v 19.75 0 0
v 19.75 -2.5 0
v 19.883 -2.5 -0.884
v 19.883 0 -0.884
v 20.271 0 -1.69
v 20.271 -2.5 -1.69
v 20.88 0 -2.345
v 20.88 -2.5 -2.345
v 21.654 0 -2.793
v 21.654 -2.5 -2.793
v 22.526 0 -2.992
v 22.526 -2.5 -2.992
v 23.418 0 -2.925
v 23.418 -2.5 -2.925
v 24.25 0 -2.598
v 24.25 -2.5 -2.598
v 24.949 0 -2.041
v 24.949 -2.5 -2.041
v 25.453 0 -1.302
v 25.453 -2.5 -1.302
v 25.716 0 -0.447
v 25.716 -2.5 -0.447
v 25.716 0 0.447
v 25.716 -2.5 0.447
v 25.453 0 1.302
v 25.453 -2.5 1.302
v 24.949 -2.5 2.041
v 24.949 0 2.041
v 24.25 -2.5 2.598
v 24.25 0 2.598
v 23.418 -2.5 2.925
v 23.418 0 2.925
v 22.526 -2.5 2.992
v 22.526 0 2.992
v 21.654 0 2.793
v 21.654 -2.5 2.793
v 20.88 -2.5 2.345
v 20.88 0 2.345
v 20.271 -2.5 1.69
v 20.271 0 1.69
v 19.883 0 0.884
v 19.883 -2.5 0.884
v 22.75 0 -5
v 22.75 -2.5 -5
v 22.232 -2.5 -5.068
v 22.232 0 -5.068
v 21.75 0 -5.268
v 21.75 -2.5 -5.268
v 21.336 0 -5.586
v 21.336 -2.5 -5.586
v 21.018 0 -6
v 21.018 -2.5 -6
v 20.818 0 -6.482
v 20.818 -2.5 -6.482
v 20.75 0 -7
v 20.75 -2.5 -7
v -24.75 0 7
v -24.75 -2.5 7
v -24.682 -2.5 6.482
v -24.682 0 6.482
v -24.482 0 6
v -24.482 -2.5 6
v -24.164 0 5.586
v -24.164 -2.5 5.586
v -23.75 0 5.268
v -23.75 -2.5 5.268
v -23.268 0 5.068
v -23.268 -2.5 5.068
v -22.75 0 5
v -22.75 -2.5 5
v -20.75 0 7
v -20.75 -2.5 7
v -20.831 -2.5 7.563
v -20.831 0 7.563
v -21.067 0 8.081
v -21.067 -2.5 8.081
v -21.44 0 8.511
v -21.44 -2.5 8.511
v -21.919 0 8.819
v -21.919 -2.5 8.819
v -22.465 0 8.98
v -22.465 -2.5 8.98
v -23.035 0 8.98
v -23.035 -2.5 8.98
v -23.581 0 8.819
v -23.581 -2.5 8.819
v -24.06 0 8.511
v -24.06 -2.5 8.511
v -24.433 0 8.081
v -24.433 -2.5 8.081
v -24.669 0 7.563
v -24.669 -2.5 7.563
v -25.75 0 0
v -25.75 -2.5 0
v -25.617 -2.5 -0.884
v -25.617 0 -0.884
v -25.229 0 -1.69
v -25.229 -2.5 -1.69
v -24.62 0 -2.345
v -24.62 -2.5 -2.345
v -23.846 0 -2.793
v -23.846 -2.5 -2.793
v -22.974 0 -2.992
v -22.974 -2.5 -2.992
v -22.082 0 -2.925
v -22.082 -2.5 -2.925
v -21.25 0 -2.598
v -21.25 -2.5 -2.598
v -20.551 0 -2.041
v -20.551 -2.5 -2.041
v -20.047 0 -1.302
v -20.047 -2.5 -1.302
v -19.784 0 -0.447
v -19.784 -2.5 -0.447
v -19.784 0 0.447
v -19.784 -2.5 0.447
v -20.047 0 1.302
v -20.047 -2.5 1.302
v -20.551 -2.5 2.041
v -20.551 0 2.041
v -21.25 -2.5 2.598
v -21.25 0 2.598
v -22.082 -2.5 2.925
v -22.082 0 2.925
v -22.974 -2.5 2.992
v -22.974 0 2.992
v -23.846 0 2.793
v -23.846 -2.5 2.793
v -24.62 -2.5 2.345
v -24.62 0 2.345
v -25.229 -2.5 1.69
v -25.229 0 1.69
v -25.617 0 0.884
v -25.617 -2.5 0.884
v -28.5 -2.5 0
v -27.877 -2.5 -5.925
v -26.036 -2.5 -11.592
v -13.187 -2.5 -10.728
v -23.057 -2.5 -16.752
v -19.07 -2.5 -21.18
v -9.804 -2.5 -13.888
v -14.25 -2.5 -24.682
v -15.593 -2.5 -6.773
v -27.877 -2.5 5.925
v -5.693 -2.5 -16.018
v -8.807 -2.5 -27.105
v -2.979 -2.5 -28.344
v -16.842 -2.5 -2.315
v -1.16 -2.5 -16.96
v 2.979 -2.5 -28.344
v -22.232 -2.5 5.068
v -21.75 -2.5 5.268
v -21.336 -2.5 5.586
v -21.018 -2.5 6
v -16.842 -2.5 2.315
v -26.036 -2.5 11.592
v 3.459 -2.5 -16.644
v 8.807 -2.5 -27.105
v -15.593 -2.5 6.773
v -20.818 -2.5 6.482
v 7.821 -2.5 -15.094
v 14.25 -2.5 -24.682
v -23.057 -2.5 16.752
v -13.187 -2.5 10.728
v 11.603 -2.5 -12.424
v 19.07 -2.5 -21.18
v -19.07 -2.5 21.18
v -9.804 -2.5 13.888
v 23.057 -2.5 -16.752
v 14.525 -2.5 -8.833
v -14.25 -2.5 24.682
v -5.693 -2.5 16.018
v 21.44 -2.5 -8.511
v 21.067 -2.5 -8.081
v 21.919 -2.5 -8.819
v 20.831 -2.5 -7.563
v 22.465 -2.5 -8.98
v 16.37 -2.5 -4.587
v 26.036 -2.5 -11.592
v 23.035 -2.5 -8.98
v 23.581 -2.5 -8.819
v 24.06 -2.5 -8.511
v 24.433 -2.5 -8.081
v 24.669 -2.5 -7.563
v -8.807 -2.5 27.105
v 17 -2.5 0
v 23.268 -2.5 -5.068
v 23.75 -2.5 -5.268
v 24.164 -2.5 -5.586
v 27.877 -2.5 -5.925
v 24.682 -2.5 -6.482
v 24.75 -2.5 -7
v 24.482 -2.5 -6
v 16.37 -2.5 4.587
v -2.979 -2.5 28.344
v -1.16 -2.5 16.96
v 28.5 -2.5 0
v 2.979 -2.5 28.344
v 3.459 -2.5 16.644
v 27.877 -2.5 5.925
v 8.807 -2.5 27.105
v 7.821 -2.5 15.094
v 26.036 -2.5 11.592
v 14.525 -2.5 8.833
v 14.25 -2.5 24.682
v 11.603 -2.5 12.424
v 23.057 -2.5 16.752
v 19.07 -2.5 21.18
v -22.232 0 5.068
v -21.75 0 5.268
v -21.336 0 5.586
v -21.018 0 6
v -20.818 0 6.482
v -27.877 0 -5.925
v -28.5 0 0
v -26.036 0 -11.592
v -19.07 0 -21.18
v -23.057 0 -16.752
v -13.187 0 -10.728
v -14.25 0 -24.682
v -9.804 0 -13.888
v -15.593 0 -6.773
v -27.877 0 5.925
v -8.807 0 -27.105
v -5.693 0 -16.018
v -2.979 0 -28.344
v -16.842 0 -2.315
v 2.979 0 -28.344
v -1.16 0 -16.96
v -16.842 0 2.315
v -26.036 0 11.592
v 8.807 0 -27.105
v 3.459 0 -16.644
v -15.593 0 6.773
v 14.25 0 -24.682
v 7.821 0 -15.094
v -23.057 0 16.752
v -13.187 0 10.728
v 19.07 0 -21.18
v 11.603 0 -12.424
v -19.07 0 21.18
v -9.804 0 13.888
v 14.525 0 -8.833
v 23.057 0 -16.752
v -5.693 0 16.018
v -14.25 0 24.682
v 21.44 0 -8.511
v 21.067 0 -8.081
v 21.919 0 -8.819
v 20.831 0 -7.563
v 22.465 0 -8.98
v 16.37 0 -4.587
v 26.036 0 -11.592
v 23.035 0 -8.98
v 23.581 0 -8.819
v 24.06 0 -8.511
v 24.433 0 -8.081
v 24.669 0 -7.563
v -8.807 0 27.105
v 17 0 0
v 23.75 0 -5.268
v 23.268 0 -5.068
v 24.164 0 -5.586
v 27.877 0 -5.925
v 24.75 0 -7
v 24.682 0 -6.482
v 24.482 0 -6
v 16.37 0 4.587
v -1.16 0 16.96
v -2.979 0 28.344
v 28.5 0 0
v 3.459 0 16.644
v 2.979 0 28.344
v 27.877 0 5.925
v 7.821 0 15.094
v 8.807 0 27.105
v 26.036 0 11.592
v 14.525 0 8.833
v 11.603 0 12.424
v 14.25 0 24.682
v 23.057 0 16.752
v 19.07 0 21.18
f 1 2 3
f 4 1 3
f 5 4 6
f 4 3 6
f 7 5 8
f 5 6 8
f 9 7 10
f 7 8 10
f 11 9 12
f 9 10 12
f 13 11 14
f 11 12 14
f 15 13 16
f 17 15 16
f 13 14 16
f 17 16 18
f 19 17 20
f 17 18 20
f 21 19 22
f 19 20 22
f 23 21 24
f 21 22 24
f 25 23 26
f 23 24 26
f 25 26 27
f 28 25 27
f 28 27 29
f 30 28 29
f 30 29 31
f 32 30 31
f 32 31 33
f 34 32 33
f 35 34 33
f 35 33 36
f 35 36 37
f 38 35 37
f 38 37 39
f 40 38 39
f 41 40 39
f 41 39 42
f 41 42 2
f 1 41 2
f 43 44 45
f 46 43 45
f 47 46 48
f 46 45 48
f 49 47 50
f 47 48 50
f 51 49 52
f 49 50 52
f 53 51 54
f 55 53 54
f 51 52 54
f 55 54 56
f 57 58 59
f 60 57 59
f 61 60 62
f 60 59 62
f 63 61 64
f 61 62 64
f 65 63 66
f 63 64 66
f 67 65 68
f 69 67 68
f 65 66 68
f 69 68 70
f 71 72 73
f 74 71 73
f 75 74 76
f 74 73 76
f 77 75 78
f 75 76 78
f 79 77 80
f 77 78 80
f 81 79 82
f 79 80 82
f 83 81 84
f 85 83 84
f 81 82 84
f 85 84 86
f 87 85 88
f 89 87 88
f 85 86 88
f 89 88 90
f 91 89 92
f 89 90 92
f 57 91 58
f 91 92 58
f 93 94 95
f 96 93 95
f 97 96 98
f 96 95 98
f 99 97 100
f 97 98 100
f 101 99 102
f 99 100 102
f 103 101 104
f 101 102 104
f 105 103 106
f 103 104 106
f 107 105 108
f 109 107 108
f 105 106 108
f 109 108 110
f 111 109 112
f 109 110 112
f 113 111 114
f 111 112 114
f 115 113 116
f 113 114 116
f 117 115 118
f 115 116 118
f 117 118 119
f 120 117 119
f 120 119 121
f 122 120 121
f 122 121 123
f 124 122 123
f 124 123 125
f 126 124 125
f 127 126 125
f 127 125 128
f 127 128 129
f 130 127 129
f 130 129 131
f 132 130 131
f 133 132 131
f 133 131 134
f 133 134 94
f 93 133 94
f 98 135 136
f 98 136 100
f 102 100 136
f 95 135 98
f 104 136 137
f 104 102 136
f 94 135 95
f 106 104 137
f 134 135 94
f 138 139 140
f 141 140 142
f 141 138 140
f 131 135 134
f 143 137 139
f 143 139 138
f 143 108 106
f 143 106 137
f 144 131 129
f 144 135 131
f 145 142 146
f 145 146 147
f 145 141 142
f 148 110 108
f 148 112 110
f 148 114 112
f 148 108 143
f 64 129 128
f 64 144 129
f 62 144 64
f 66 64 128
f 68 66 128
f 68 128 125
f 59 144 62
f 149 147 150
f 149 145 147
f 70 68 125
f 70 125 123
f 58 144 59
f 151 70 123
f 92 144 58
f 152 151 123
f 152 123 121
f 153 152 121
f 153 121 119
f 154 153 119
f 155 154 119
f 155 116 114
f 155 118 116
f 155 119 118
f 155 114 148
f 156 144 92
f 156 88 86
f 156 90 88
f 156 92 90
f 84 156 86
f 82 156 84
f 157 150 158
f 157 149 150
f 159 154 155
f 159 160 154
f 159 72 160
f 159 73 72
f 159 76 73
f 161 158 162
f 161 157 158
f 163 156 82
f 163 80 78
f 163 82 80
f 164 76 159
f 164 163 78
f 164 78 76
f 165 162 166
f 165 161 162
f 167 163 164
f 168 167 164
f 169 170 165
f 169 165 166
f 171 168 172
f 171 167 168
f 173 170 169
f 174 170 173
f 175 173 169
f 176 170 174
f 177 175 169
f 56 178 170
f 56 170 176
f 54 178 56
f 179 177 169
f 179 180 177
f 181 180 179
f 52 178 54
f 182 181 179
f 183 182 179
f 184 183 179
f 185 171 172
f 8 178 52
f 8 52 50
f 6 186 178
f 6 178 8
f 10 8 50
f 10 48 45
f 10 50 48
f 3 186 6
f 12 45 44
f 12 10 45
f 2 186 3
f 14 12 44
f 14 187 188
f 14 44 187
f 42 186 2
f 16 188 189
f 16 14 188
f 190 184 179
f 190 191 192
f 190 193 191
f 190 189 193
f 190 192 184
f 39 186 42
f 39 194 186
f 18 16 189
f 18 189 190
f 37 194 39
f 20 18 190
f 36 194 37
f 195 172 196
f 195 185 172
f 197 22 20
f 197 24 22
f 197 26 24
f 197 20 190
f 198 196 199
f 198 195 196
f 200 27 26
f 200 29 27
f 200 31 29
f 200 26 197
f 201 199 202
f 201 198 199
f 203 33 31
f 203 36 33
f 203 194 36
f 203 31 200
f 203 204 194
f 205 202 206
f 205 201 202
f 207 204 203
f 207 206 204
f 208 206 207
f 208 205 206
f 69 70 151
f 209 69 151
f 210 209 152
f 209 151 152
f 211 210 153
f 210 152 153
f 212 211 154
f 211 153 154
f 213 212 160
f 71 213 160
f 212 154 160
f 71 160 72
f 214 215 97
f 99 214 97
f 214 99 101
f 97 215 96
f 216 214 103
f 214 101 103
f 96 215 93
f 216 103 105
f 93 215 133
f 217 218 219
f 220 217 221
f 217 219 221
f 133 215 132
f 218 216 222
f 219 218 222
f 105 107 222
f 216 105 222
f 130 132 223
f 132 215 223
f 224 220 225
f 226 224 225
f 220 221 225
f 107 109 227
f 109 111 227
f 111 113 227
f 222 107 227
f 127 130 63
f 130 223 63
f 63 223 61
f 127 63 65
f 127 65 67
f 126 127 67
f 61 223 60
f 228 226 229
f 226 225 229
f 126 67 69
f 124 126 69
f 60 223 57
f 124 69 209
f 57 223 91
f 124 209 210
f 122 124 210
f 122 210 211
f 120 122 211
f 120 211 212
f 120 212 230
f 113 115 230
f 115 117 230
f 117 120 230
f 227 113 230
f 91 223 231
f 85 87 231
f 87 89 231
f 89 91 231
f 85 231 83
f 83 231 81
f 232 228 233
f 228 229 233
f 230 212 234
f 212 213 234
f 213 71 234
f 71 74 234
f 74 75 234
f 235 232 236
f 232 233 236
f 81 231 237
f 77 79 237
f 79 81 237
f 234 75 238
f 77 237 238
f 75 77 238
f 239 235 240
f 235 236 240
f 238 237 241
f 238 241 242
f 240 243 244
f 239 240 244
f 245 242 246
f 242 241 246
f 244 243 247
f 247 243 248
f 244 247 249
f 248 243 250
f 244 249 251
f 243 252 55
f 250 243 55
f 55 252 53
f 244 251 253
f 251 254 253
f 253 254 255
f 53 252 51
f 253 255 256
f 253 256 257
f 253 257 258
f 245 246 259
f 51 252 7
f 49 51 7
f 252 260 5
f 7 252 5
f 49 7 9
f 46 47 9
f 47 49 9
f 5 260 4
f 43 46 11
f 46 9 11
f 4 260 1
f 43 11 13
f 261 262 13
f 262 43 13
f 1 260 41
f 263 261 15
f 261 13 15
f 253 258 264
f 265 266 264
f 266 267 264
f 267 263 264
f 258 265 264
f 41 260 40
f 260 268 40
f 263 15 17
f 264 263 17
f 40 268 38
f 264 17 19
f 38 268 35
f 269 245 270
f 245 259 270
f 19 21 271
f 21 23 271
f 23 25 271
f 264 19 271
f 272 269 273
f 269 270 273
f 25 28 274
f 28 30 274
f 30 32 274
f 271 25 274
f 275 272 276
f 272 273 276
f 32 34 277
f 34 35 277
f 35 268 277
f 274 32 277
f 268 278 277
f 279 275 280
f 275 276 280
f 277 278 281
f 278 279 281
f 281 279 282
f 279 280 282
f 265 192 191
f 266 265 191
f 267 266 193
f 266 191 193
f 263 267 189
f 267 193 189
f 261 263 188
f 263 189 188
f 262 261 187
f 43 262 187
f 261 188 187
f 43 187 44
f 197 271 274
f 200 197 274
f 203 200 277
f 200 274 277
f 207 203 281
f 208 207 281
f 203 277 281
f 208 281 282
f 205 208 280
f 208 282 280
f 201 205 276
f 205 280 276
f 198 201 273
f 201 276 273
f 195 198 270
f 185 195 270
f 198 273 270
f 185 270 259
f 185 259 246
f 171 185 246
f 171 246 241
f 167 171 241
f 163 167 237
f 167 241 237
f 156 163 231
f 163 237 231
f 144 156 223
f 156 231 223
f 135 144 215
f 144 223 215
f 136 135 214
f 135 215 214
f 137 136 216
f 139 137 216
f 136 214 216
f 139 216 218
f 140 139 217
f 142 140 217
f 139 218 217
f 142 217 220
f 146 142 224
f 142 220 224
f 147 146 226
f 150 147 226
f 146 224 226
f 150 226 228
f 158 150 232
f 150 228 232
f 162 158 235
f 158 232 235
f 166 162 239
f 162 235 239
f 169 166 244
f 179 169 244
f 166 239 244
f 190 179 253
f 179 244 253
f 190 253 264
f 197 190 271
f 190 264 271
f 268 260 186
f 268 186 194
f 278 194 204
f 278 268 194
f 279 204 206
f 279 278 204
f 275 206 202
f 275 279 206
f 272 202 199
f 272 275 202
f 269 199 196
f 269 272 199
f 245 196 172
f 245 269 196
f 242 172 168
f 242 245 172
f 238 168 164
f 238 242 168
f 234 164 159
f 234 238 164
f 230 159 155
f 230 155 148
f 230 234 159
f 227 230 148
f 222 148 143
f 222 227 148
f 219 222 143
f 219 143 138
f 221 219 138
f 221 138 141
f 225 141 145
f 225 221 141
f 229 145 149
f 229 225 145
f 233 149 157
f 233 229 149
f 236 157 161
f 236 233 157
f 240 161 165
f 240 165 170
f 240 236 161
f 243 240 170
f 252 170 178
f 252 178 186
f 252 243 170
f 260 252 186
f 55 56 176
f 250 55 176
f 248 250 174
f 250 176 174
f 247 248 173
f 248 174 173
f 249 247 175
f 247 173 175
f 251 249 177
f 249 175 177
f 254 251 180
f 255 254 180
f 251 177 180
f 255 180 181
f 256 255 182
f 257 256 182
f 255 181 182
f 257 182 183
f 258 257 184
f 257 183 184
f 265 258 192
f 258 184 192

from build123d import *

# Parameters (mm, degrees)
F0_R     = 28.5
F0_R_2   = 17
F1_DEPTH = 2.5
F3_DEPTH = 25
F6_DEPTH = 25
F7_DEPTH = 25


with BuildPart() as f1:
    # F0 (on Front) → F1 (new body)
    with BuildSketch(Plane.XZ):
        Circle(F0_R)
        Circle(F0_R_2, mode=Mode.SUBTRACT)
    extrude(amount=F1_DEPTH)

    # F2 (on face) → F3 (cut)
    with BuildSketch(Plane.XZ.offset(2.5)):
        with BuildLine():
            Line((-25.75, 0), (-19.75, 0))
            ThreePointArc((-19.75, 0), (-22.75, 3), (-25.75, 0))
        make_face()
        with BuildLine():
            ThreePointArc((-25.75, 0), (-22.75, -3), (-19.75, 0))
            Line((-19.75, 0), (-25.75, 0))
        make_face()
        with BuildLine():
            ThreePointArc((25.75, 0), (22.75, 3), (19.75, 0))
            Line((19.75, 0), (25.75, 0))
        make_face()
        with BuildLine():
            Line((25.75, 0), (19.75, 0))
            ThreePointArc((19.75, 0), (22.75, -3), (25.75, 0))
        make_face()
    extrude(amount=-F3_DEPTH, mode=Mode.SUBTRACT)

    # F5 (on face) → F6 (cut)
    with BuildSketch(Plane.XZ.offset(2.5)):
        with BuildLine():
            Line((-24.75, 7), (-22.75, 7))
            Line((-22.75, 7), (-20.75, 7))
            ThreePointArc((-20.75, 7), (-22.75, 9), (-24.75, 7))
        make_face()
        with BuildLine():
            Line((-22.75, 7), (-22.75, 5))
            ThreePointArc((-22.75, 5), (-21.3357864376, 5.5857864376), (-20.75, 7))
            Line((-20.75, 7), (-22.75, 7))
        make_face()
        with BuildLine():
            ThreePointArc((-24.75, 7), (-24.1642135624, 5.5857864376), (-22.75, 5))
            Line((-22.75, 5), (-22.75, 7))
            Line((-22.75, 7), (-24.75, 7))
        make_face()
    extrude(amount=-F6_DEPTH, mode=Mode.SUBTRACT)

    # F4 (on face) → F7 (cut)
    with BuildSketch(Plane.XZ.offset(2.5)):
        with BuildLine():
            Line((24.75, -7), (22.75, -7))
            Line((22.75, -7), (20.75, -7))
            ThreePointArc((20.75, -7), (22.75, -9), (24.75, -7))
        make_face()
        with BuildLine():
            Line((22.75, -7), (22.75, -5))
            ThreePointArc((22.75, -5), (21.3357864376, -5.5857864376), (20.75, -7))
            Line((20.75, -7), (22.75, -7))
        make_face()
        with BuildLine():
            ThreePointArc((24.75, -7), (24.1642135624, -5.5857864376), (22.75, -5))
            Line((22.75, -5), (22.75, -7))
            Line((22.75, -7), (24.75, -7))
        make_face()
    extrude(amount=-F7_DEPTH, mode=Mode.SUBTRACT)


solid = f1.part
